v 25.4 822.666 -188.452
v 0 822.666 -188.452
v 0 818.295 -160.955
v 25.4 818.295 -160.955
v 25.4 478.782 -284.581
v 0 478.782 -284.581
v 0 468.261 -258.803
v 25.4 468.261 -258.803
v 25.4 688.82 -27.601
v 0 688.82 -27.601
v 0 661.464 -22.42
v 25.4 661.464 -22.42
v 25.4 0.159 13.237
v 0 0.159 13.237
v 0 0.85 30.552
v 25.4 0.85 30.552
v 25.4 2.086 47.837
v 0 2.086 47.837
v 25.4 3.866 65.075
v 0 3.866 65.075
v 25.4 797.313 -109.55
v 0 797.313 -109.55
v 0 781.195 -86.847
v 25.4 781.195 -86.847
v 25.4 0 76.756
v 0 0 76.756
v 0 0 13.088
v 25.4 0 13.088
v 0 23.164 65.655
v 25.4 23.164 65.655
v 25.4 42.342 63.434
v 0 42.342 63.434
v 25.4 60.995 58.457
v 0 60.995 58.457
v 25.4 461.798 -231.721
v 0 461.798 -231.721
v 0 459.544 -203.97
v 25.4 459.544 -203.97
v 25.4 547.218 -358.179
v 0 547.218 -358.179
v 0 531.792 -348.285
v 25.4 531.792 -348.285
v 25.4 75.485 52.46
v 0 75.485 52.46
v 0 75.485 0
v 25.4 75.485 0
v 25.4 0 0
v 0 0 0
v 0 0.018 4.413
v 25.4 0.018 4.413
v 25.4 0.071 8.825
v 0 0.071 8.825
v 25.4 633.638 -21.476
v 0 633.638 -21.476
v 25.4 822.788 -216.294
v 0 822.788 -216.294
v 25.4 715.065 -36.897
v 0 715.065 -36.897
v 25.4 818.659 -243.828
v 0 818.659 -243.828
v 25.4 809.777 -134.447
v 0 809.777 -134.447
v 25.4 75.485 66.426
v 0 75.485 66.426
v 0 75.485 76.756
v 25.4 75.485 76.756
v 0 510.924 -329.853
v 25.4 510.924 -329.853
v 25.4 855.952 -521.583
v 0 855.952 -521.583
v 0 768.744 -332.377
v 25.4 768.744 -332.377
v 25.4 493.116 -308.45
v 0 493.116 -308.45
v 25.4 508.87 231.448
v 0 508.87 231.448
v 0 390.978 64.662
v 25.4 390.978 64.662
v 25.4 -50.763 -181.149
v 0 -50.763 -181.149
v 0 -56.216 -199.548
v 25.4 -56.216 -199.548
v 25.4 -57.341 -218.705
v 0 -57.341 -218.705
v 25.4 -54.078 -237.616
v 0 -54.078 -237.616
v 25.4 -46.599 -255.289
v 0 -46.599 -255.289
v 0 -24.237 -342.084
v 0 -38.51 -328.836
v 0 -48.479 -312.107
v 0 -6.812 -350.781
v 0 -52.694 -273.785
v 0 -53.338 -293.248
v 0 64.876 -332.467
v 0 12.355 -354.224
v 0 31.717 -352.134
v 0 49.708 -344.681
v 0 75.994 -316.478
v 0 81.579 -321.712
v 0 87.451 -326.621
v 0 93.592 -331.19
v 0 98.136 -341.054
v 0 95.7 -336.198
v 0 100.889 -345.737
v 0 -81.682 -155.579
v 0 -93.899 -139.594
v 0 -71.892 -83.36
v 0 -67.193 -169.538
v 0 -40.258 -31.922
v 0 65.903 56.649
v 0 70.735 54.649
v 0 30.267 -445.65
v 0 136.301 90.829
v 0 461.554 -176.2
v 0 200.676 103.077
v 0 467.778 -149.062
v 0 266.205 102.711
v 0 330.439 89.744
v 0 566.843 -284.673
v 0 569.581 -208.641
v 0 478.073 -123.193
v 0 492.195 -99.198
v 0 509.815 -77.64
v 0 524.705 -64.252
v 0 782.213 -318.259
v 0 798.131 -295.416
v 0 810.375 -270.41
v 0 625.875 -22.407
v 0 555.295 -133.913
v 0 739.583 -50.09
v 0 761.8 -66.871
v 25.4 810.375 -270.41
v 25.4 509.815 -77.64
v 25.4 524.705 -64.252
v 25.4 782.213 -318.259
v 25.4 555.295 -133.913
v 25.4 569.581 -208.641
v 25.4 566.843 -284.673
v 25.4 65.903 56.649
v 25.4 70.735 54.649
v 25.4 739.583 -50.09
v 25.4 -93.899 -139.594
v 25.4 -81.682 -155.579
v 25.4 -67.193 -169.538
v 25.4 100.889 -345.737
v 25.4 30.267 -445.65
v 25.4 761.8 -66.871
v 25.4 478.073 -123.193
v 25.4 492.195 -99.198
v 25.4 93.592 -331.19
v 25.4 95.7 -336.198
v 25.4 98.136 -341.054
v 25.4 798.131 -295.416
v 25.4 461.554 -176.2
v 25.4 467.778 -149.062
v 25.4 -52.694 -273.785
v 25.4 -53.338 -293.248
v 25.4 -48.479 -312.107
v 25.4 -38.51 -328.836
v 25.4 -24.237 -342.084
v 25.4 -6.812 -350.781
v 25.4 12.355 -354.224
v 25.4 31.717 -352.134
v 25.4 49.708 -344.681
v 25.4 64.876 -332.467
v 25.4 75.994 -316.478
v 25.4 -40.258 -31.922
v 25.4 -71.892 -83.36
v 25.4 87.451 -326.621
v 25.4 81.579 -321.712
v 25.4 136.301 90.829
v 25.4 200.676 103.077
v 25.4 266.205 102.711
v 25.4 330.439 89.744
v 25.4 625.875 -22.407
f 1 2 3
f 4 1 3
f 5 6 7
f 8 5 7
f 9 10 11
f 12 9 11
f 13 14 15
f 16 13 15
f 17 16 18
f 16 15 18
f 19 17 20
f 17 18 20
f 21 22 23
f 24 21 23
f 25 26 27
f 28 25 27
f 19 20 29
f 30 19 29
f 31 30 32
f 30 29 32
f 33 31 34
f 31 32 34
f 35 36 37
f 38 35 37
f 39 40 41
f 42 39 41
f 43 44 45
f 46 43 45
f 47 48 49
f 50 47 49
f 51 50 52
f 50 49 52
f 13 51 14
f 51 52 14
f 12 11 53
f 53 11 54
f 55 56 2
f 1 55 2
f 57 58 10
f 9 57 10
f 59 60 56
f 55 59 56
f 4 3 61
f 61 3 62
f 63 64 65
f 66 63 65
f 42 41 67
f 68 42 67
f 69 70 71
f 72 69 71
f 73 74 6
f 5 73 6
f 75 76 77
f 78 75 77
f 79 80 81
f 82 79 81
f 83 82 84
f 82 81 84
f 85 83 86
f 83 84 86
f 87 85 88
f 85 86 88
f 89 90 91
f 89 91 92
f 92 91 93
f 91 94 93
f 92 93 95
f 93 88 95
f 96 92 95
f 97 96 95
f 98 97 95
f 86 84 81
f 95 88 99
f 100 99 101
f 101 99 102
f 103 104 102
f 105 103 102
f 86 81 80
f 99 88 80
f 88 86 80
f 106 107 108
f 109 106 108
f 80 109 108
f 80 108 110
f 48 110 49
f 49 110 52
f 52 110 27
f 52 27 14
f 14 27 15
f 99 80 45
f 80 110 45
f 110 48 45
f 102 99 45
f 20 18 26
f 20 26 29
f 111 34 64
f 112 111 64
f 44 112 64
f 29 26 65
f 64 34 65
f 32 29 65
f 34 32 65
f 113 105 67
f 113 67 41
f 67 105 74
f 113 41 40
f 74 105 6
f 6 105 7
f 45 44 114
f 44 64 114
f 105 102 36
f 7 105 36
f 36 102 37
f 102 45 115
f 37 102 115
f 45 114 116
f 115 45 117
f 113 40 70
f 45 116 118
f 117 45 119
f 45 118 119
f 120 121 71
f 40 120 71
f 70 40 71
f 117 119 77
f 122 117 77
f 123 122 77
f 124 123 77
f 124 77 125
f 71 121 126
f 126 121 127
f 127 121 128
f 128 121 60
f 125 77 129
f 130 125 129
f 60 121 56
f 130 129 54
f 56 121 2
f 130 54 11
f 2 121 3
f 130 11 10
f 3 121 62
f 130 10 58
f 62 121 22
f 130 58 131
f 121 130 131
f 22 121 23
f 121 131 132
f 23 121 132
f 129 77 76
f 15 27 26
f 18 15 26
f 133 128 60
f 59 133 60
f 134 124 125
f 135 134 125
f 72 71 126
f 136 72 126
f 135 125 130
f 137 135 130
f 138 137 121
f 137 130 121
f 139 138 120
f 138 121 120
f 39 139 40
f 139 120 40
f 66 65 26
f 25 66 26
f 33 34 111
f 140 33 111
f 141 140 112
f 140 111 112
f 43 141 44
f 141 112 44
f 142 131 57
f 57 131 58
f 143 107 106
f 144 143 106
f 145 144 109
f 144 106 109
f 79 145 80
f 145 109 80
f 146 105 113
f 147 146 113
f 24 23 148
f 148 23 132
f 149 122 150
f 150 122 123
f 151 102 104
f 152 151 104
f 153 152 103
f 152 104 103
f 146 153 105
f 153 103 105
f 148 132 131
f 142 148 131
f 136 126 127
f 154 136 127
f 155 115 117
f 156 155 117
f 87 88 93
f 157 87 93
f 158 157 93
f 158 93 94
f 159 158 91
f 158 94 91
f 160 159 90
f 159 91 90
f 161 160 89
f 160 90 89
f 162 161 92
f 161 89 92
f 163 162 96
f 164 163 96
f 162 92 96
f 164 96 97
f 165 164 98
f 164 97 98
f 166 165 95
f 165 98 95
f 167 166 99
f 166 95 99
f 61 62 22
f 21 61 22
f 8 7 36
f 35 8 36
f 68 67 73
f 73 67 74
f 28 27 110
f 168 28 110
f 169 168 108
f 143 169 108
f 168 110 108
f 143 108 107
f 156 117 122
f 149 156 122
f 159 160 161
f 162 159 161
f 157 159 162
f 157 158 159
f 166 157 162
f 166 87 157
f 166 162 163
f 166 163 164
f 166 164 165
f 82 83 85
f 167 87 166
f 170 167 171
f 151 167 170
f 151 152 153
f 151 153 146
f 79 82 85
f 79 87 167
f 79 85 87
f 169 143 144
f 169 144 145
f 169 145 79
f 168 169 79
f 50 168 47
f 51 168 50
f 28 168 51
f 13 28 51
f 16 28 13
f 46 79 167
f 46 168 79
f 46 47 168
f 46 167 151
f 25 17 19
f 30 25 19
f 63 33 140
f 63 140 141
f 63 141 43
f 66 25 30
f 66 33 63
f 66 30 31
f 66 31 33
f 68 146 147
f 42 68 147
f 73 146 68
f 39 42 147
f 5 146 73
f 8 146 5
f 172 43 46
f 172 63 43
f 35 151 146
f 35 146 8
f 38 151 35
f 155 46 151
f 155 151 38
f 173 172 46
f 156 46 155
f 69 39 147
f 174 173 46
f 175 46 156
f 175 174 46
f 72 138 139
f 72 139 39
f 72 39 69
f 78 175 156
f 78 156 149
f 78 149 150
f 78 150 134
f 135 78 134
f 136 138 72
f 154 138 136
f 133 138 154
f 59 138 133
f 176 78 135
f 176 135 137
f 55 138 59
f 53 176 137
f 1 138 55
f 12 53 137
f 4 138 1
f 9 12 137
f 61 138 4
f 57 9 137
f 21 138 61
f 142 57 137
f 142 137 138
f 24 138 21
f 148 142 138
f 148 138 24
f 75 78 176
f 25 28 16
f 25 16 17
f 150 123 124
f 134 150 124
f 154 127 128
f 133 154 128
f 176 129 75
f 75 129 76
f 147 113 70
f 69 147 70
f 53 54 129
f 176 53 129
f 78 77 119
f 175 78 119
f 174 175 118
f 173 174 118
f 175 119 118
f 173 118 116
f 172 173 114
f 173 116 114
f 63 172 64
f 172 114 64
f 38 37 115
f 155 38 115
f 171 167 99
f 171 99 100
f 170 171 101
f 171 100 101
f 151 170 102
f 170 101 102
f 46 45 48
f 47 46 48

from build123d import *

# Parameters (mm, degrees)
F1_DEPTH = 25.4


with BuildPart() as f1:
    # F0 (on Right) → F1 (new body)
    with BuildSketch(Plane.YZ):
        with BuildLine():
            Line((5.3862427492, 76.7555311322), (0, 76.7555311322))
            Line((0, 76.7555311322), (0, 64.6187240932))
            ThreePointArc((0, 64.6187240932), (1.9314521574, 64.8609267634), (3.8662446042, 65.0748140172))
            ThreePointArc((3.8662446042, 65.0748140172), (4.5949489658, 70.9192449191), (5.3862427492, 76.7555311322))
        make_face()
        with BuildLine():
            Line((75.4848867655, 76.7555311322), (5.3862427492, 76.7555311322))
            ThreePointArc((5.3862427492, 76.7555311322), (4.5949489658, 70.9192449191), (3.8662446042, 65.0748140172))
            ThreePointArc((3.8662446042, 65.0748140172), (32.7930120665, 64.8934055874), (60.9952815162, 58.4573522376))
            ThreePointArc((60.9952815162, 58.4573522376), (68.191493841, 62.5298426374), (75.4848867655, 66.4256184947))
            Line((75.4848867655, 66.4256184947), (75.4848867655, 76.7555311322))
        make_face()
        with BuildLine():
            ThreePointArc((3.8662446042, 65.0748140172), (1.9314521574, 64.8609267634), (0, 64.6187240932))
            Line((0, 64.6187240932), (0, 13.0880264162))
            ThreePointArc((0, 13.0880264162), (0.0797042079, 13.1625355732), (0.1594323913, 13.2370190749))
            ThreePointArc((0.1594323913, 13.2370190749), (1.399759177, 39.199756565), (3.8662446042, 65.0748140172))
        make_face()
        with BuildLine():
            ThreePointArc((0.1594323913, 13.2370190749), (0.0797042079, 13.1625355732), (0, 13.0880264162))
            Line((0, 13.0880264162), (0, 0))
            ThreePointArc((0, 0), (0.0398595433, 6.6189895882), (0.1594323913, 13.2370190749))
        make_face()
        with BuildLine():
            Line((0, 0), (0, 13.0880264162))
            ThreePointArc((0, 13.0880264162), (-57.2227485948, -56.9347894415), (-93.8985440453, -139.5938707663))
            ThreePointArc((-93.8985440453, -139.5938707663), (-74.7023537588, -162.8329992856), (-50.7631260646, -181.1486809071))
            ThreePointArc((-50.7631260646, -181.1486809071), (134.418433918, -130.3074814993), (75.4848867655, 52.459787821))
            Line((75.4848867655, 52.459787821), (75.4848867655, 0))
            Line((75.4848867655, 0), (0, 0))
        make_face()
        with BuildLine():
            ThreePointArc((390.9781885196, 64.6620097575), (233.4491947056, 104.480650876), (75.4848867655, 66.4256184947))
            Line((75.4848867655, 66.4256184947), (75.4848867655, 52.459787821))
            ThreePointArc((75.4848867655, 52.459787821), (134.418433918, -130.3074814993), (-50.7631260646, -181.1486809071))
            ThreePointArc((-50.7631260646, -181.1486809071), (-57.3407742049, -218.7050554571), (-46.5994364643, -255.2888003165))
            ThreePointArc((-46.5994364643, -255.2888003165), (-15.8351680469, -347.0549469278), (75.9935366918, -316.4779153328))
            ThreePointArc((75.9935366918, -316.4779153328), (84.4804183959, -324.2078161859), (93.5921058689, -331.1903429243))
            ThreePointArc((93.5921058689, -331.1903429243), (99.5887961578, -335.1608026322), (105.7880268546, -338.8069490201))
            Line((105.7880268546, -338.8069490201), (390.9781885196, 64.6620097575))
        make_face()
        with BuildLine():
            Line((75.4848867655, 52.459787821), (75.4848867655, 66.4256184947))
            ThreePointArc((75.4848867655, 66.4256184947), (68.191493841, 62.5298426374), (60.9952815162, 58.4573522376))
            ThreePointArc((60.9952815162, 58.4573522376), (68.3286241876, 55.6724752477), (75.4848867655, 52.459787821))
        make_face()
        with BuildLine():
            Line((508.869806802, 231.447596607), (390.9781885196, 64.6620097575))
            ThreePointArc((390.9781885196, 64.6620097575), (466.8429069503, 9.5420995027), (524.7053222998, -64.2522153119))
            Line((524.7053222998, -64.2522153119), (530.5195744083, -59.0245212478))
            Line((530.5195744083, -59.0245212478), (553.822797689, -43.7876499609))
            Line((553.822797689, -43.7876499609), (579.178814564, -32.2865687022))
            Line((579.178814564, -32.2865687022), (605.9933014884, -24.7908530686))
            Line((605.9933014884, -24.7908530686), (625.8747293704, -22.4070069681))
            Line((625.8747293704, -22.4070069681), (508.869806802, 231.447596607))
        make_face()
        with BuildLine():
            ThreePointArc((524.7053222998, -64.2522153119), (466.8429069503, 9.5420995027), (390.9781885196, 64.6620097575))
            Line((390.9781885196, 64.6620097575), (105.7880268546, -338.8069490201))
            ThreePointArc((105.7880268546, -338.8069490201), (176.1168073384, -355.610653428), (245.0538575649, -333.7889909744))
            ThreePointArc((245.0538575649, -333.7889909744), (176.5880738948, -383.3985207357), (100.8892695091, -345.7374003159))
            Line((100.8892695091, -345.7374003159), (30.2667221668, -445.6497026059))
            Line((30.2667221668, -445.6497026059), (459.8510392405, -485.156246703))
            ThreePointArc((459.8510392405, -485.156246703), (510.8462412084, -426.6986552247), (547.2178651376, -358.1792740399))
            Line((547.2178651376, -358.1792740399), (531.7915045279, -348.2852703807))
            Line((531.7915045279, -348.2852703807), (510.9243750188, -329.8525449194))
            Line((510.9243750188, -329.8525449194), (493.1155417724, -308.4504908057))
            Line((493.1155417724, -308.4504908057), (478.7824287459, -284.5807540487))
            Line((478.7824287459, -284.5807540487), (468.2609919604, -258.8028210468))
            Line((468.2609919604, -258.8028210468), (461.7978449766, -231.7209047013))
            Line((461.7978449766, -231.7209047013), (459.5444784819, -203.9697821776))
            Line((459.5444784819, -203.9697821776), (461.5537094771, -176.1999162671))
            Line((461.5537094771, -176.1999162671), (467.7784432907, -149.0622090899))
            Line((467.7784432907, -149.0622090899), (478.0727774378, -123.1927455016))
            Line((478.0727774378, -123.1927455016), (492.1954214511, -99.1978838026))
            Line((492.1954214511, -99.1978838026), (509.8153525247, -77.640043214))
            Line((509.8153525247, -77.640043214), (524.7053222998, -64.2522153119))
        make_face()
        with BuildLine():
            Line((530.5195744083, -59.0245212478), (524.7053222998, -64.2522153119))
            ThreePointArc((524.7053222998, -64.2522153119), (569.58102559, -208.6407558217), (547.2178651376, -358.1792740399))
            Line((547.2178651376, -358.1792740399), (555.2278224701, -363.3166197278))
            Line((555.2278224701, -363.3166197278), (580.6840014165, -374.594270872))
            Line((580.6840014165, -374.594270872), (607.5633701083, -381.8538852288))
            Line((607.5633701083, -381.8538852288), (635.2358989253, -384.9253035909))
            Line((635.2358989253, -384.9253035909), (663.0529672461, -383.7365345149))
            Line((663.0529672461, -383.7365345149), (690.362566566, -378.3154417404))
            Line((690.362566566, -378.3154417404), (716.5245830234, -368.7890910874))
            Line((716.5245830234, -368.7890910874), (740.9258011265, -355.3807721411))
            Line((740.9258011265, -355.3807721411), (762.9942770044, -338.4047645331))
            Line((762.9942770044, -338.4047645331), (768.7441699807, -332.3774288358))
            Line((768.7441699807, -332.3774288358), (625.8747293704, -22.4070069681))
            Line((625.8747293704, -22.4070069681), (605.9933014884, -24.7908530686))
            Line((605.9933014884, -24.7908530686), (579.178814564, -32.2865687022))
            Line((579.178814564, -32.2865687022), (553.822797689, -43.7876499609))
            Line((553.822797689, -43.7876499609), (530.5195744083, -59.0245212478))
        make_face()
        with BuildLine():
            Line((100.8892695091, -345.7374003159), (105.7880268546, -338.8069490201))
            ThreePointArc((105.7880268546, -338.8069490201), (99.5887961578, -335.1608026322), (93.5921058689, -331.1903429243))
            ThreePointArc((93.5921058689, -331.1903429243), (96.8772664999, -338.6461726736), (100.8892695091, -345.7374003159))
        make_face()
        with BuildLine():
            ThreePointArc((245.0538575649, -333.7889909744), (176.1168073384, -355.610653428), (105.7880268546, -338.8069490201))
            Line((105.7880268546, -338.8069490201), (100.8892695091, -345.7374003159))
            ThreePointArc((100.8892695091, -345.7374003159), (176.5880738948, -383.3985207357), (245.0538575649, -333.7889909744))
        make_face()
        with BuildLine():
            Line((555.2278224701, -363.3166197278), (547.2178651376, -358.1792740399))
            ThreePointArc((547.2178651376, -358.1792740399), (510.8462412084, -426.6986552247), (459.8510392405, -485.156246703))
            Line((459.8510392405, -485.156246703), (855.9517264366, -521.5834826231))
            Line((855.9517264366, -521.5834826231), (768.7441699807, -332.3774288358))
            Line((768.7441699807, -332.3774288358), (762.9942770044, -338.4047645331))
            Line((762.9942770044, -338.4047645331), (740.9258011265, -355.3807721411))
            Line((740.9258011265, -355.3807721411), (716.5245830234, -368.7890910874))
            Line((716.5245830234, -368.7890910874), (690.362566566, -378.3154417404))
            Line((690.362566566, -378.3154417404), (663.0529672461, -383.7365345149))
            Line((663.0529672461, -383.7365345149), (635.2358989253, -384.9253035909))
            Line((635.2358989253, -384.9253035909), (607.5633701083, -381.8538852288))
            Line((607.5633701083, -381.8538852288), (580.6840014165, -374.594270872))
            Line((580.6840014165, -374.594270872), (555.2278224701, -363.3166197278))
        make_face()
        Polygon((633.6377496157, -21.4761962813), (625.8747293704, -22.4070069681), (768.7441699807, -332.3774288358), (782.212744287, -318.2589714936), (798.13073839, -295.4155933367), (810.3751550229, -270.4100594852), (818.658995438, -243.8284784588), (822.7880934368, -216.2938999874), (822.665666462, -188.4517112531), (818.2945840981, -160.9545095619), (809.7773008109, -134.4468060158), (797.3134545018, -109.5499187191), (781.1951871644, -86.8474096084), (761.8002973238, -66.8714062555), (739.5833847597, -50.0901292482), (715.0651950722, -36.8969174962), (688.8204138471, -27.6010087011), (661.4641965122, -22.4202910862), align=None)
    extrude(amount=F1_DEPTH)


solid = f1.part
